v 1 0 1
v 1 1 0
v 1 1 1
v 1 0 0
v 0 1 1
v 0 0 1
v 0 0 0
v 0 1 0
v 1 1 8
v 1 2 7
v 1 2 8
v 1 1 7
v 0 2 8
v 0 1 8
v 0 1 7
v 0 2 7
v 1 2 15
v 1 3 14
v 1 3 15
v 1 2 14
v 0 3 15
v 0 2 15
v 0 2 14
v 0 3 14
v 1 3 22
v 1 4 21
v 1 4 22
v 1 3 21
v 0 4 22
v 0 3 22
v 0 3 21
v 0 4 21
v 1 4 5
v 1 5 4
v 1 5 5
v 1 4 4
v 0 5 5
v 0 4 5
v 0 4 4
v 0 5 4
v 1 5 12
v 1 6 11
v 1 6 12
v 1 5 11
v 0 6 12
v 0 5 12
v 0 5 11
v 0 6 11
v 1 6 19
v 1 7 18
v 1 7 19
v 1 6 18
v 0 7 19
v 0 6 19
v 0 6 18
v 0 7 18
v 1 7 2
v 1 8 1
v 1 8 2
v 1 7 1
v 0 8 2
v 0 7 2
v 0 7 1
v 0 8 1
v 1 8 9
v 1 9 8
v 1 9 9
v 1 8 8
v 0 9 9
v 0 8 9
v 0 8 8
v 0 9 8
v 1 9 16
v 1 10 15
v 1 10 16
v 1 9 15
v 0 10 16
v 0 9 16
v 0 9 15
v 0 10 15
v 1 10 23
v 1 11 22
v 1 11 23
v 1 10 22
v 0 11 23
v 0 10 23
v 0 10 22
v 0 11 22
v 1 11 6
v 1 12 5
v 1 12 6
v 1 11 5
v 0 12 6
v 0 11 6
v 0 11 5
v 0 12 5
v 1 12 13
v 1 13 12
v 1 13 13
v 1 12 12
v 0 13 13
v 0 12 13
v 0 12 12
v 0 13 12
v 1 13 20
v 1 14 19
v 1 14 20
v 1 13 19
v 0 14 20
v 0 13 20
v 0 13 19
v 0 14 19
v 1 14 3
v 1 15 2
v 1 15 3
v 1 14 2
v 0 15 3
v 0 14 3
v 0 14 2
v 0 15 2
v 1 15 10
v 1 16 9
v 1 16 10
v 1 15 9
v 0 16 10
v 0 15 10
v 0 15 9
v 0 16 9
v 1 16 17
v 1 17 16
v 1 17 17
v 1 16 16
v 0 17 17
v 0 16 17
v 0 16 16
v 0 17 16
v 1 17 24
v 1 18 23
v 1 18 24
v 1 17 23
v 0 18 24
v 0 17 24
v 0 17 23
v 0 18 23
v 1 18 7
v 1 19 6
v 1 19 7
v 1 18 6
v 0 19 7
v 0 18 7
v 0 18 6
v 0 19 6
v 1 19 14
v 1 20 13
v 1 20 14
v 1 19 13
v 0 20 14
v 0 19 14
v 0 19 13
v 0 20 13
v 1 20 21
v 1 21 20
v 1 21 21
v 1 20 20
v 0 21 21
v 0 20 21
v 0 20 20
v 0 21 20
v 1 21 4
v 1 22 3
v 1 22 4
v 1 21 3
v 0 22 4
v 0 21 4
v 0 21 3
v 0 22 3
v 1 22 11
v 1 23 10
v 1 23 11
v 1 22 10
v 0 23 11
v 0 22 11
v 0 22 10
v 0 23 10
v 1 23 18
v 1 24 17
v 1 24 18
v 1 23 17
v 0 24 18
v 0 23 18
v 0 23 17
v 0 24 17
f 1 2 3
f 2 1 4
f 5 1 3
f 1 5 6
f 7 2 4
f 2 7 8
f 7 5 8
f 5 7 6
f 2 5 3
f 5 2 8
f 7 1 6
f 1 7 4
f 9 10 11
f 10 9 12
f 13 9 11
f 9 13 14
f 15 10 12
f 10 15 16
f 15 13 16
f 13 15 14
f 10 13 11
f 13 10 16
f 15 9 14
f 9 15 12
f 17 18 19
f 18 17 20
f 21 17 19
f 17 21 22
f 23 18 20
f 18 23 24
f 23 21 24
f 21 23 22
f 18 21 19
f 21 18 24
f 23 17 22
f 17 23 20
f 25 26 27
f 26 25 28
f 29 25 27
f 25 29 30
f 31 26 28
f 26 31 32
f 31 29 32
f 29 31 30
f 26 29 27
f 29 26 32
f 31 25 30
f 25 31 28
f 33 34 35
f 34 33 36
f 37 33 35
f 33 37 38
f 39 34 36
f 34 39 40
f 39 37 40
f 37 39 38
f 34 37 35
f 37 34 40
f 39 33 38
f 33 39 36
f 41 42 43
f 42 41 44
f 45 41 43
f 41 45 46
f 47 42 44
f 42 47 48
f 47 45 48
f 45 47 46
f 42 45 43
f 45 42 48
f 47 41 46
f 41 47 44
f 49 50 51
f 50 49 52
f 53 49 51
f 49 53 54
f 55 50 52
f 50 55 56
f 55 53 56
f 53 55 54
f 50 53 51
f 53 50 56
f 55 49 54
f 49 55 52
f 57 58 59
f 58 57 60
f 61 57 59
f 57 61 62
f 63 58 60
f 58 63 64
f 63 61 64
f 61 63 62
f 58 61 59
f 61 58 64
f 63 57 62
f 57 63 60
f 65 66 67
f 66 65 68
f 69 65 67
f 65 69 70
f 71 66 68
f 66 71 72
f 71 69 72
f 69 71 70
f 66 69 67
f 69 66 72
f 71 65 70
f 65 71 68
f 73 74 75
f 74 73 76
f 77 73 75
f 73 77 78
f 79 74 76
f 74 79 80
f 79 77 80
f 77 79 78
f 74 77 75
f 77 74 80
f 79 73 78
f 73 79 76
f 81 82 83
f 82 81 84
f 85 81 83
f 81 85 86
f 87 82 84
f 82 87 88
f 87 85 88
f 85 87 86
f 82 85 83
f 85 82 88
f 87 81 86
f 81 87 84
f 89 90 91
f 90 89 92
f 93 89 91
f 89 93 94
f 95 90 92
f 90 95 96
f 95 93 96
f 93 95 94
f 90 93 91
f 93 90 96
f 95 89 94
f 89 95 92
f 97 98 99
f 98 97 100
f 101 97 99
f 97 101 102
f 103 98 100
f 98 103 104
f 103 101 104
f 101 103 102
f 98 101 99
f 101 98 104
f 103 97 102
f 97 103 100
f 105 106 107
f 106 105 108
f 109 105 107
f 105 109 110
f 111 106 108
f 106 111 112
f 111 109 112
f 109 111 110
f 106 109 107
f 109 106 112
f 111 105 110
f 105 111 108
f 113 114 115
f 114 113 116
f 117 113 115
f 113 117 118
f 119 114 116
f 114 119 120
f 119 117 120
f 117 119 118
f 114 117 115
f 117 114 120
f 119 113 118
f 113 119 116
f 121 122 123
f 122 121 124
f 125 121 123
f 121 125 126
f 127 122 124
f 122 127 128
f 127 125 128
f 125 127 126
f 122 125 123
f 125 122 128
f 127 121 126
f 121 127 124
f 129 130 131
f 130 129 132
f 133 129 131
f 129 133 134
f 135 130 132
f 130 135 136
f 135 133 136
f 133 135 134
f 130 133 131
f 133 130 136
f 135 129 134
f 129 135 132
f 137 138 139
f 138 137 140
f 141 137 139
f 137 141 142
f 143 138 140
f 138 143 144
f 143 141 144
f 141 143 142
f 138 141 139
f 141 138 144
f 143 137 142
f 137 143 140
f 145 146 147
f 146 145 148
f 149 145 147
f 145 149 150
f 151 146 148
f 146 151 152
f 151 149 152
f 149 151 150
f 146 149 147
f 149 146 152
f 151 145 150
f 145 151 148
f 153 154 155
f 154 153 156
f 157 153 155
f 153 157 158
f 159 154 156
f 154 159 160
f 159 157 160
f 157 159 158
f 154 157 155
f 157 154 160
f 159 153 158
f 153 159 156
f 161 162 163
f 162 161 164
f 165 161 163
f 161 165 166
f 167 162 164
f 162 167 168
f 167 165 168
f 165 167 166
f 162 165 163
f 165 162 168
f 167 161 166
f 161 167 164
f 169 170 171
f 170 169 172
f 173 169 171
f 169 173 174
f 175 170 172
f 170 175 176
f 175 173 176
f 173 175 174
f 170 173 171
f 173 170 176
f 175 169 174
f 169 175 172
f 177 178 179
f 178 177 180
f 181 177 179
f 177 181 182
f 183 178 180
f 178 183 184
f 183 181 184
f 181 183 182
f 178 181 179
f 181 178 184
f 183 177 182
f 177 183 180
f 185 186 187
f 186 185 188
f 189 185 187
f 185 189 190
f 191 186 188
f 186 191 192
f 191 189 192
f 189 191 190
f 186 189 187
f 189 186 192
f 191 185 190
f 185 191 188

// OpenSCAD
union() {
    translate([0, 0, 0]) cube([1, 1, 1]);
    translate([0, 1, 7]) cube([1, 1, 1]);
    translate([0, 2, 14]) cube([1, 1, 1]);
    translate([0, 3, 21]) cube([1, 1, 1]);
    translate([0, 4, 4]) cube([1, 1, 1]);
    translate([0, 5, 11]) cube([1, 1, 1]);
    translate([0, 6, 18]) cube([1, 1, 1]);
    translate([0, 7, 1]) cube([1, 1, 1]);
    translate([0, 8, 8]) cube([1, 1, 1]);
    translate([0, 9, 15]) cube([1, 1, 1]);
    translate([0, 10, 22]) cube([1, 1, 1]);
    translate([0, 11, 5]) cube([1, 1, 1]);
    translate([0, 12, 12]) cube([1, 1, 1]);
    translate([0, 13, 19]) cube([1, 1, 1]);
    translate([0, 14, 2]) cube([1, 1, 1]);
    translate([0, 15, 9]) cube([1, 1, 1]);
    translate([0, 16, 16]) cube([1, 1, 1]);
    translate([0, 17, 23]) cube([1, 1, 1]);
    translate([0, 18, 6]) cube([1, 1, 1]);
    translate([0, 19, 13]) cube([1, 1, 1]);
    translate([0, 20, 20]) cube([1, 1, 1]);
    translate([0, 21, 3]) cube([1, 1, 1]);
    translate([0, 22, 10]) cube([1, 1, 1]);
    translate([0, 23, 17]) cube([1, 1, 1]);
}
